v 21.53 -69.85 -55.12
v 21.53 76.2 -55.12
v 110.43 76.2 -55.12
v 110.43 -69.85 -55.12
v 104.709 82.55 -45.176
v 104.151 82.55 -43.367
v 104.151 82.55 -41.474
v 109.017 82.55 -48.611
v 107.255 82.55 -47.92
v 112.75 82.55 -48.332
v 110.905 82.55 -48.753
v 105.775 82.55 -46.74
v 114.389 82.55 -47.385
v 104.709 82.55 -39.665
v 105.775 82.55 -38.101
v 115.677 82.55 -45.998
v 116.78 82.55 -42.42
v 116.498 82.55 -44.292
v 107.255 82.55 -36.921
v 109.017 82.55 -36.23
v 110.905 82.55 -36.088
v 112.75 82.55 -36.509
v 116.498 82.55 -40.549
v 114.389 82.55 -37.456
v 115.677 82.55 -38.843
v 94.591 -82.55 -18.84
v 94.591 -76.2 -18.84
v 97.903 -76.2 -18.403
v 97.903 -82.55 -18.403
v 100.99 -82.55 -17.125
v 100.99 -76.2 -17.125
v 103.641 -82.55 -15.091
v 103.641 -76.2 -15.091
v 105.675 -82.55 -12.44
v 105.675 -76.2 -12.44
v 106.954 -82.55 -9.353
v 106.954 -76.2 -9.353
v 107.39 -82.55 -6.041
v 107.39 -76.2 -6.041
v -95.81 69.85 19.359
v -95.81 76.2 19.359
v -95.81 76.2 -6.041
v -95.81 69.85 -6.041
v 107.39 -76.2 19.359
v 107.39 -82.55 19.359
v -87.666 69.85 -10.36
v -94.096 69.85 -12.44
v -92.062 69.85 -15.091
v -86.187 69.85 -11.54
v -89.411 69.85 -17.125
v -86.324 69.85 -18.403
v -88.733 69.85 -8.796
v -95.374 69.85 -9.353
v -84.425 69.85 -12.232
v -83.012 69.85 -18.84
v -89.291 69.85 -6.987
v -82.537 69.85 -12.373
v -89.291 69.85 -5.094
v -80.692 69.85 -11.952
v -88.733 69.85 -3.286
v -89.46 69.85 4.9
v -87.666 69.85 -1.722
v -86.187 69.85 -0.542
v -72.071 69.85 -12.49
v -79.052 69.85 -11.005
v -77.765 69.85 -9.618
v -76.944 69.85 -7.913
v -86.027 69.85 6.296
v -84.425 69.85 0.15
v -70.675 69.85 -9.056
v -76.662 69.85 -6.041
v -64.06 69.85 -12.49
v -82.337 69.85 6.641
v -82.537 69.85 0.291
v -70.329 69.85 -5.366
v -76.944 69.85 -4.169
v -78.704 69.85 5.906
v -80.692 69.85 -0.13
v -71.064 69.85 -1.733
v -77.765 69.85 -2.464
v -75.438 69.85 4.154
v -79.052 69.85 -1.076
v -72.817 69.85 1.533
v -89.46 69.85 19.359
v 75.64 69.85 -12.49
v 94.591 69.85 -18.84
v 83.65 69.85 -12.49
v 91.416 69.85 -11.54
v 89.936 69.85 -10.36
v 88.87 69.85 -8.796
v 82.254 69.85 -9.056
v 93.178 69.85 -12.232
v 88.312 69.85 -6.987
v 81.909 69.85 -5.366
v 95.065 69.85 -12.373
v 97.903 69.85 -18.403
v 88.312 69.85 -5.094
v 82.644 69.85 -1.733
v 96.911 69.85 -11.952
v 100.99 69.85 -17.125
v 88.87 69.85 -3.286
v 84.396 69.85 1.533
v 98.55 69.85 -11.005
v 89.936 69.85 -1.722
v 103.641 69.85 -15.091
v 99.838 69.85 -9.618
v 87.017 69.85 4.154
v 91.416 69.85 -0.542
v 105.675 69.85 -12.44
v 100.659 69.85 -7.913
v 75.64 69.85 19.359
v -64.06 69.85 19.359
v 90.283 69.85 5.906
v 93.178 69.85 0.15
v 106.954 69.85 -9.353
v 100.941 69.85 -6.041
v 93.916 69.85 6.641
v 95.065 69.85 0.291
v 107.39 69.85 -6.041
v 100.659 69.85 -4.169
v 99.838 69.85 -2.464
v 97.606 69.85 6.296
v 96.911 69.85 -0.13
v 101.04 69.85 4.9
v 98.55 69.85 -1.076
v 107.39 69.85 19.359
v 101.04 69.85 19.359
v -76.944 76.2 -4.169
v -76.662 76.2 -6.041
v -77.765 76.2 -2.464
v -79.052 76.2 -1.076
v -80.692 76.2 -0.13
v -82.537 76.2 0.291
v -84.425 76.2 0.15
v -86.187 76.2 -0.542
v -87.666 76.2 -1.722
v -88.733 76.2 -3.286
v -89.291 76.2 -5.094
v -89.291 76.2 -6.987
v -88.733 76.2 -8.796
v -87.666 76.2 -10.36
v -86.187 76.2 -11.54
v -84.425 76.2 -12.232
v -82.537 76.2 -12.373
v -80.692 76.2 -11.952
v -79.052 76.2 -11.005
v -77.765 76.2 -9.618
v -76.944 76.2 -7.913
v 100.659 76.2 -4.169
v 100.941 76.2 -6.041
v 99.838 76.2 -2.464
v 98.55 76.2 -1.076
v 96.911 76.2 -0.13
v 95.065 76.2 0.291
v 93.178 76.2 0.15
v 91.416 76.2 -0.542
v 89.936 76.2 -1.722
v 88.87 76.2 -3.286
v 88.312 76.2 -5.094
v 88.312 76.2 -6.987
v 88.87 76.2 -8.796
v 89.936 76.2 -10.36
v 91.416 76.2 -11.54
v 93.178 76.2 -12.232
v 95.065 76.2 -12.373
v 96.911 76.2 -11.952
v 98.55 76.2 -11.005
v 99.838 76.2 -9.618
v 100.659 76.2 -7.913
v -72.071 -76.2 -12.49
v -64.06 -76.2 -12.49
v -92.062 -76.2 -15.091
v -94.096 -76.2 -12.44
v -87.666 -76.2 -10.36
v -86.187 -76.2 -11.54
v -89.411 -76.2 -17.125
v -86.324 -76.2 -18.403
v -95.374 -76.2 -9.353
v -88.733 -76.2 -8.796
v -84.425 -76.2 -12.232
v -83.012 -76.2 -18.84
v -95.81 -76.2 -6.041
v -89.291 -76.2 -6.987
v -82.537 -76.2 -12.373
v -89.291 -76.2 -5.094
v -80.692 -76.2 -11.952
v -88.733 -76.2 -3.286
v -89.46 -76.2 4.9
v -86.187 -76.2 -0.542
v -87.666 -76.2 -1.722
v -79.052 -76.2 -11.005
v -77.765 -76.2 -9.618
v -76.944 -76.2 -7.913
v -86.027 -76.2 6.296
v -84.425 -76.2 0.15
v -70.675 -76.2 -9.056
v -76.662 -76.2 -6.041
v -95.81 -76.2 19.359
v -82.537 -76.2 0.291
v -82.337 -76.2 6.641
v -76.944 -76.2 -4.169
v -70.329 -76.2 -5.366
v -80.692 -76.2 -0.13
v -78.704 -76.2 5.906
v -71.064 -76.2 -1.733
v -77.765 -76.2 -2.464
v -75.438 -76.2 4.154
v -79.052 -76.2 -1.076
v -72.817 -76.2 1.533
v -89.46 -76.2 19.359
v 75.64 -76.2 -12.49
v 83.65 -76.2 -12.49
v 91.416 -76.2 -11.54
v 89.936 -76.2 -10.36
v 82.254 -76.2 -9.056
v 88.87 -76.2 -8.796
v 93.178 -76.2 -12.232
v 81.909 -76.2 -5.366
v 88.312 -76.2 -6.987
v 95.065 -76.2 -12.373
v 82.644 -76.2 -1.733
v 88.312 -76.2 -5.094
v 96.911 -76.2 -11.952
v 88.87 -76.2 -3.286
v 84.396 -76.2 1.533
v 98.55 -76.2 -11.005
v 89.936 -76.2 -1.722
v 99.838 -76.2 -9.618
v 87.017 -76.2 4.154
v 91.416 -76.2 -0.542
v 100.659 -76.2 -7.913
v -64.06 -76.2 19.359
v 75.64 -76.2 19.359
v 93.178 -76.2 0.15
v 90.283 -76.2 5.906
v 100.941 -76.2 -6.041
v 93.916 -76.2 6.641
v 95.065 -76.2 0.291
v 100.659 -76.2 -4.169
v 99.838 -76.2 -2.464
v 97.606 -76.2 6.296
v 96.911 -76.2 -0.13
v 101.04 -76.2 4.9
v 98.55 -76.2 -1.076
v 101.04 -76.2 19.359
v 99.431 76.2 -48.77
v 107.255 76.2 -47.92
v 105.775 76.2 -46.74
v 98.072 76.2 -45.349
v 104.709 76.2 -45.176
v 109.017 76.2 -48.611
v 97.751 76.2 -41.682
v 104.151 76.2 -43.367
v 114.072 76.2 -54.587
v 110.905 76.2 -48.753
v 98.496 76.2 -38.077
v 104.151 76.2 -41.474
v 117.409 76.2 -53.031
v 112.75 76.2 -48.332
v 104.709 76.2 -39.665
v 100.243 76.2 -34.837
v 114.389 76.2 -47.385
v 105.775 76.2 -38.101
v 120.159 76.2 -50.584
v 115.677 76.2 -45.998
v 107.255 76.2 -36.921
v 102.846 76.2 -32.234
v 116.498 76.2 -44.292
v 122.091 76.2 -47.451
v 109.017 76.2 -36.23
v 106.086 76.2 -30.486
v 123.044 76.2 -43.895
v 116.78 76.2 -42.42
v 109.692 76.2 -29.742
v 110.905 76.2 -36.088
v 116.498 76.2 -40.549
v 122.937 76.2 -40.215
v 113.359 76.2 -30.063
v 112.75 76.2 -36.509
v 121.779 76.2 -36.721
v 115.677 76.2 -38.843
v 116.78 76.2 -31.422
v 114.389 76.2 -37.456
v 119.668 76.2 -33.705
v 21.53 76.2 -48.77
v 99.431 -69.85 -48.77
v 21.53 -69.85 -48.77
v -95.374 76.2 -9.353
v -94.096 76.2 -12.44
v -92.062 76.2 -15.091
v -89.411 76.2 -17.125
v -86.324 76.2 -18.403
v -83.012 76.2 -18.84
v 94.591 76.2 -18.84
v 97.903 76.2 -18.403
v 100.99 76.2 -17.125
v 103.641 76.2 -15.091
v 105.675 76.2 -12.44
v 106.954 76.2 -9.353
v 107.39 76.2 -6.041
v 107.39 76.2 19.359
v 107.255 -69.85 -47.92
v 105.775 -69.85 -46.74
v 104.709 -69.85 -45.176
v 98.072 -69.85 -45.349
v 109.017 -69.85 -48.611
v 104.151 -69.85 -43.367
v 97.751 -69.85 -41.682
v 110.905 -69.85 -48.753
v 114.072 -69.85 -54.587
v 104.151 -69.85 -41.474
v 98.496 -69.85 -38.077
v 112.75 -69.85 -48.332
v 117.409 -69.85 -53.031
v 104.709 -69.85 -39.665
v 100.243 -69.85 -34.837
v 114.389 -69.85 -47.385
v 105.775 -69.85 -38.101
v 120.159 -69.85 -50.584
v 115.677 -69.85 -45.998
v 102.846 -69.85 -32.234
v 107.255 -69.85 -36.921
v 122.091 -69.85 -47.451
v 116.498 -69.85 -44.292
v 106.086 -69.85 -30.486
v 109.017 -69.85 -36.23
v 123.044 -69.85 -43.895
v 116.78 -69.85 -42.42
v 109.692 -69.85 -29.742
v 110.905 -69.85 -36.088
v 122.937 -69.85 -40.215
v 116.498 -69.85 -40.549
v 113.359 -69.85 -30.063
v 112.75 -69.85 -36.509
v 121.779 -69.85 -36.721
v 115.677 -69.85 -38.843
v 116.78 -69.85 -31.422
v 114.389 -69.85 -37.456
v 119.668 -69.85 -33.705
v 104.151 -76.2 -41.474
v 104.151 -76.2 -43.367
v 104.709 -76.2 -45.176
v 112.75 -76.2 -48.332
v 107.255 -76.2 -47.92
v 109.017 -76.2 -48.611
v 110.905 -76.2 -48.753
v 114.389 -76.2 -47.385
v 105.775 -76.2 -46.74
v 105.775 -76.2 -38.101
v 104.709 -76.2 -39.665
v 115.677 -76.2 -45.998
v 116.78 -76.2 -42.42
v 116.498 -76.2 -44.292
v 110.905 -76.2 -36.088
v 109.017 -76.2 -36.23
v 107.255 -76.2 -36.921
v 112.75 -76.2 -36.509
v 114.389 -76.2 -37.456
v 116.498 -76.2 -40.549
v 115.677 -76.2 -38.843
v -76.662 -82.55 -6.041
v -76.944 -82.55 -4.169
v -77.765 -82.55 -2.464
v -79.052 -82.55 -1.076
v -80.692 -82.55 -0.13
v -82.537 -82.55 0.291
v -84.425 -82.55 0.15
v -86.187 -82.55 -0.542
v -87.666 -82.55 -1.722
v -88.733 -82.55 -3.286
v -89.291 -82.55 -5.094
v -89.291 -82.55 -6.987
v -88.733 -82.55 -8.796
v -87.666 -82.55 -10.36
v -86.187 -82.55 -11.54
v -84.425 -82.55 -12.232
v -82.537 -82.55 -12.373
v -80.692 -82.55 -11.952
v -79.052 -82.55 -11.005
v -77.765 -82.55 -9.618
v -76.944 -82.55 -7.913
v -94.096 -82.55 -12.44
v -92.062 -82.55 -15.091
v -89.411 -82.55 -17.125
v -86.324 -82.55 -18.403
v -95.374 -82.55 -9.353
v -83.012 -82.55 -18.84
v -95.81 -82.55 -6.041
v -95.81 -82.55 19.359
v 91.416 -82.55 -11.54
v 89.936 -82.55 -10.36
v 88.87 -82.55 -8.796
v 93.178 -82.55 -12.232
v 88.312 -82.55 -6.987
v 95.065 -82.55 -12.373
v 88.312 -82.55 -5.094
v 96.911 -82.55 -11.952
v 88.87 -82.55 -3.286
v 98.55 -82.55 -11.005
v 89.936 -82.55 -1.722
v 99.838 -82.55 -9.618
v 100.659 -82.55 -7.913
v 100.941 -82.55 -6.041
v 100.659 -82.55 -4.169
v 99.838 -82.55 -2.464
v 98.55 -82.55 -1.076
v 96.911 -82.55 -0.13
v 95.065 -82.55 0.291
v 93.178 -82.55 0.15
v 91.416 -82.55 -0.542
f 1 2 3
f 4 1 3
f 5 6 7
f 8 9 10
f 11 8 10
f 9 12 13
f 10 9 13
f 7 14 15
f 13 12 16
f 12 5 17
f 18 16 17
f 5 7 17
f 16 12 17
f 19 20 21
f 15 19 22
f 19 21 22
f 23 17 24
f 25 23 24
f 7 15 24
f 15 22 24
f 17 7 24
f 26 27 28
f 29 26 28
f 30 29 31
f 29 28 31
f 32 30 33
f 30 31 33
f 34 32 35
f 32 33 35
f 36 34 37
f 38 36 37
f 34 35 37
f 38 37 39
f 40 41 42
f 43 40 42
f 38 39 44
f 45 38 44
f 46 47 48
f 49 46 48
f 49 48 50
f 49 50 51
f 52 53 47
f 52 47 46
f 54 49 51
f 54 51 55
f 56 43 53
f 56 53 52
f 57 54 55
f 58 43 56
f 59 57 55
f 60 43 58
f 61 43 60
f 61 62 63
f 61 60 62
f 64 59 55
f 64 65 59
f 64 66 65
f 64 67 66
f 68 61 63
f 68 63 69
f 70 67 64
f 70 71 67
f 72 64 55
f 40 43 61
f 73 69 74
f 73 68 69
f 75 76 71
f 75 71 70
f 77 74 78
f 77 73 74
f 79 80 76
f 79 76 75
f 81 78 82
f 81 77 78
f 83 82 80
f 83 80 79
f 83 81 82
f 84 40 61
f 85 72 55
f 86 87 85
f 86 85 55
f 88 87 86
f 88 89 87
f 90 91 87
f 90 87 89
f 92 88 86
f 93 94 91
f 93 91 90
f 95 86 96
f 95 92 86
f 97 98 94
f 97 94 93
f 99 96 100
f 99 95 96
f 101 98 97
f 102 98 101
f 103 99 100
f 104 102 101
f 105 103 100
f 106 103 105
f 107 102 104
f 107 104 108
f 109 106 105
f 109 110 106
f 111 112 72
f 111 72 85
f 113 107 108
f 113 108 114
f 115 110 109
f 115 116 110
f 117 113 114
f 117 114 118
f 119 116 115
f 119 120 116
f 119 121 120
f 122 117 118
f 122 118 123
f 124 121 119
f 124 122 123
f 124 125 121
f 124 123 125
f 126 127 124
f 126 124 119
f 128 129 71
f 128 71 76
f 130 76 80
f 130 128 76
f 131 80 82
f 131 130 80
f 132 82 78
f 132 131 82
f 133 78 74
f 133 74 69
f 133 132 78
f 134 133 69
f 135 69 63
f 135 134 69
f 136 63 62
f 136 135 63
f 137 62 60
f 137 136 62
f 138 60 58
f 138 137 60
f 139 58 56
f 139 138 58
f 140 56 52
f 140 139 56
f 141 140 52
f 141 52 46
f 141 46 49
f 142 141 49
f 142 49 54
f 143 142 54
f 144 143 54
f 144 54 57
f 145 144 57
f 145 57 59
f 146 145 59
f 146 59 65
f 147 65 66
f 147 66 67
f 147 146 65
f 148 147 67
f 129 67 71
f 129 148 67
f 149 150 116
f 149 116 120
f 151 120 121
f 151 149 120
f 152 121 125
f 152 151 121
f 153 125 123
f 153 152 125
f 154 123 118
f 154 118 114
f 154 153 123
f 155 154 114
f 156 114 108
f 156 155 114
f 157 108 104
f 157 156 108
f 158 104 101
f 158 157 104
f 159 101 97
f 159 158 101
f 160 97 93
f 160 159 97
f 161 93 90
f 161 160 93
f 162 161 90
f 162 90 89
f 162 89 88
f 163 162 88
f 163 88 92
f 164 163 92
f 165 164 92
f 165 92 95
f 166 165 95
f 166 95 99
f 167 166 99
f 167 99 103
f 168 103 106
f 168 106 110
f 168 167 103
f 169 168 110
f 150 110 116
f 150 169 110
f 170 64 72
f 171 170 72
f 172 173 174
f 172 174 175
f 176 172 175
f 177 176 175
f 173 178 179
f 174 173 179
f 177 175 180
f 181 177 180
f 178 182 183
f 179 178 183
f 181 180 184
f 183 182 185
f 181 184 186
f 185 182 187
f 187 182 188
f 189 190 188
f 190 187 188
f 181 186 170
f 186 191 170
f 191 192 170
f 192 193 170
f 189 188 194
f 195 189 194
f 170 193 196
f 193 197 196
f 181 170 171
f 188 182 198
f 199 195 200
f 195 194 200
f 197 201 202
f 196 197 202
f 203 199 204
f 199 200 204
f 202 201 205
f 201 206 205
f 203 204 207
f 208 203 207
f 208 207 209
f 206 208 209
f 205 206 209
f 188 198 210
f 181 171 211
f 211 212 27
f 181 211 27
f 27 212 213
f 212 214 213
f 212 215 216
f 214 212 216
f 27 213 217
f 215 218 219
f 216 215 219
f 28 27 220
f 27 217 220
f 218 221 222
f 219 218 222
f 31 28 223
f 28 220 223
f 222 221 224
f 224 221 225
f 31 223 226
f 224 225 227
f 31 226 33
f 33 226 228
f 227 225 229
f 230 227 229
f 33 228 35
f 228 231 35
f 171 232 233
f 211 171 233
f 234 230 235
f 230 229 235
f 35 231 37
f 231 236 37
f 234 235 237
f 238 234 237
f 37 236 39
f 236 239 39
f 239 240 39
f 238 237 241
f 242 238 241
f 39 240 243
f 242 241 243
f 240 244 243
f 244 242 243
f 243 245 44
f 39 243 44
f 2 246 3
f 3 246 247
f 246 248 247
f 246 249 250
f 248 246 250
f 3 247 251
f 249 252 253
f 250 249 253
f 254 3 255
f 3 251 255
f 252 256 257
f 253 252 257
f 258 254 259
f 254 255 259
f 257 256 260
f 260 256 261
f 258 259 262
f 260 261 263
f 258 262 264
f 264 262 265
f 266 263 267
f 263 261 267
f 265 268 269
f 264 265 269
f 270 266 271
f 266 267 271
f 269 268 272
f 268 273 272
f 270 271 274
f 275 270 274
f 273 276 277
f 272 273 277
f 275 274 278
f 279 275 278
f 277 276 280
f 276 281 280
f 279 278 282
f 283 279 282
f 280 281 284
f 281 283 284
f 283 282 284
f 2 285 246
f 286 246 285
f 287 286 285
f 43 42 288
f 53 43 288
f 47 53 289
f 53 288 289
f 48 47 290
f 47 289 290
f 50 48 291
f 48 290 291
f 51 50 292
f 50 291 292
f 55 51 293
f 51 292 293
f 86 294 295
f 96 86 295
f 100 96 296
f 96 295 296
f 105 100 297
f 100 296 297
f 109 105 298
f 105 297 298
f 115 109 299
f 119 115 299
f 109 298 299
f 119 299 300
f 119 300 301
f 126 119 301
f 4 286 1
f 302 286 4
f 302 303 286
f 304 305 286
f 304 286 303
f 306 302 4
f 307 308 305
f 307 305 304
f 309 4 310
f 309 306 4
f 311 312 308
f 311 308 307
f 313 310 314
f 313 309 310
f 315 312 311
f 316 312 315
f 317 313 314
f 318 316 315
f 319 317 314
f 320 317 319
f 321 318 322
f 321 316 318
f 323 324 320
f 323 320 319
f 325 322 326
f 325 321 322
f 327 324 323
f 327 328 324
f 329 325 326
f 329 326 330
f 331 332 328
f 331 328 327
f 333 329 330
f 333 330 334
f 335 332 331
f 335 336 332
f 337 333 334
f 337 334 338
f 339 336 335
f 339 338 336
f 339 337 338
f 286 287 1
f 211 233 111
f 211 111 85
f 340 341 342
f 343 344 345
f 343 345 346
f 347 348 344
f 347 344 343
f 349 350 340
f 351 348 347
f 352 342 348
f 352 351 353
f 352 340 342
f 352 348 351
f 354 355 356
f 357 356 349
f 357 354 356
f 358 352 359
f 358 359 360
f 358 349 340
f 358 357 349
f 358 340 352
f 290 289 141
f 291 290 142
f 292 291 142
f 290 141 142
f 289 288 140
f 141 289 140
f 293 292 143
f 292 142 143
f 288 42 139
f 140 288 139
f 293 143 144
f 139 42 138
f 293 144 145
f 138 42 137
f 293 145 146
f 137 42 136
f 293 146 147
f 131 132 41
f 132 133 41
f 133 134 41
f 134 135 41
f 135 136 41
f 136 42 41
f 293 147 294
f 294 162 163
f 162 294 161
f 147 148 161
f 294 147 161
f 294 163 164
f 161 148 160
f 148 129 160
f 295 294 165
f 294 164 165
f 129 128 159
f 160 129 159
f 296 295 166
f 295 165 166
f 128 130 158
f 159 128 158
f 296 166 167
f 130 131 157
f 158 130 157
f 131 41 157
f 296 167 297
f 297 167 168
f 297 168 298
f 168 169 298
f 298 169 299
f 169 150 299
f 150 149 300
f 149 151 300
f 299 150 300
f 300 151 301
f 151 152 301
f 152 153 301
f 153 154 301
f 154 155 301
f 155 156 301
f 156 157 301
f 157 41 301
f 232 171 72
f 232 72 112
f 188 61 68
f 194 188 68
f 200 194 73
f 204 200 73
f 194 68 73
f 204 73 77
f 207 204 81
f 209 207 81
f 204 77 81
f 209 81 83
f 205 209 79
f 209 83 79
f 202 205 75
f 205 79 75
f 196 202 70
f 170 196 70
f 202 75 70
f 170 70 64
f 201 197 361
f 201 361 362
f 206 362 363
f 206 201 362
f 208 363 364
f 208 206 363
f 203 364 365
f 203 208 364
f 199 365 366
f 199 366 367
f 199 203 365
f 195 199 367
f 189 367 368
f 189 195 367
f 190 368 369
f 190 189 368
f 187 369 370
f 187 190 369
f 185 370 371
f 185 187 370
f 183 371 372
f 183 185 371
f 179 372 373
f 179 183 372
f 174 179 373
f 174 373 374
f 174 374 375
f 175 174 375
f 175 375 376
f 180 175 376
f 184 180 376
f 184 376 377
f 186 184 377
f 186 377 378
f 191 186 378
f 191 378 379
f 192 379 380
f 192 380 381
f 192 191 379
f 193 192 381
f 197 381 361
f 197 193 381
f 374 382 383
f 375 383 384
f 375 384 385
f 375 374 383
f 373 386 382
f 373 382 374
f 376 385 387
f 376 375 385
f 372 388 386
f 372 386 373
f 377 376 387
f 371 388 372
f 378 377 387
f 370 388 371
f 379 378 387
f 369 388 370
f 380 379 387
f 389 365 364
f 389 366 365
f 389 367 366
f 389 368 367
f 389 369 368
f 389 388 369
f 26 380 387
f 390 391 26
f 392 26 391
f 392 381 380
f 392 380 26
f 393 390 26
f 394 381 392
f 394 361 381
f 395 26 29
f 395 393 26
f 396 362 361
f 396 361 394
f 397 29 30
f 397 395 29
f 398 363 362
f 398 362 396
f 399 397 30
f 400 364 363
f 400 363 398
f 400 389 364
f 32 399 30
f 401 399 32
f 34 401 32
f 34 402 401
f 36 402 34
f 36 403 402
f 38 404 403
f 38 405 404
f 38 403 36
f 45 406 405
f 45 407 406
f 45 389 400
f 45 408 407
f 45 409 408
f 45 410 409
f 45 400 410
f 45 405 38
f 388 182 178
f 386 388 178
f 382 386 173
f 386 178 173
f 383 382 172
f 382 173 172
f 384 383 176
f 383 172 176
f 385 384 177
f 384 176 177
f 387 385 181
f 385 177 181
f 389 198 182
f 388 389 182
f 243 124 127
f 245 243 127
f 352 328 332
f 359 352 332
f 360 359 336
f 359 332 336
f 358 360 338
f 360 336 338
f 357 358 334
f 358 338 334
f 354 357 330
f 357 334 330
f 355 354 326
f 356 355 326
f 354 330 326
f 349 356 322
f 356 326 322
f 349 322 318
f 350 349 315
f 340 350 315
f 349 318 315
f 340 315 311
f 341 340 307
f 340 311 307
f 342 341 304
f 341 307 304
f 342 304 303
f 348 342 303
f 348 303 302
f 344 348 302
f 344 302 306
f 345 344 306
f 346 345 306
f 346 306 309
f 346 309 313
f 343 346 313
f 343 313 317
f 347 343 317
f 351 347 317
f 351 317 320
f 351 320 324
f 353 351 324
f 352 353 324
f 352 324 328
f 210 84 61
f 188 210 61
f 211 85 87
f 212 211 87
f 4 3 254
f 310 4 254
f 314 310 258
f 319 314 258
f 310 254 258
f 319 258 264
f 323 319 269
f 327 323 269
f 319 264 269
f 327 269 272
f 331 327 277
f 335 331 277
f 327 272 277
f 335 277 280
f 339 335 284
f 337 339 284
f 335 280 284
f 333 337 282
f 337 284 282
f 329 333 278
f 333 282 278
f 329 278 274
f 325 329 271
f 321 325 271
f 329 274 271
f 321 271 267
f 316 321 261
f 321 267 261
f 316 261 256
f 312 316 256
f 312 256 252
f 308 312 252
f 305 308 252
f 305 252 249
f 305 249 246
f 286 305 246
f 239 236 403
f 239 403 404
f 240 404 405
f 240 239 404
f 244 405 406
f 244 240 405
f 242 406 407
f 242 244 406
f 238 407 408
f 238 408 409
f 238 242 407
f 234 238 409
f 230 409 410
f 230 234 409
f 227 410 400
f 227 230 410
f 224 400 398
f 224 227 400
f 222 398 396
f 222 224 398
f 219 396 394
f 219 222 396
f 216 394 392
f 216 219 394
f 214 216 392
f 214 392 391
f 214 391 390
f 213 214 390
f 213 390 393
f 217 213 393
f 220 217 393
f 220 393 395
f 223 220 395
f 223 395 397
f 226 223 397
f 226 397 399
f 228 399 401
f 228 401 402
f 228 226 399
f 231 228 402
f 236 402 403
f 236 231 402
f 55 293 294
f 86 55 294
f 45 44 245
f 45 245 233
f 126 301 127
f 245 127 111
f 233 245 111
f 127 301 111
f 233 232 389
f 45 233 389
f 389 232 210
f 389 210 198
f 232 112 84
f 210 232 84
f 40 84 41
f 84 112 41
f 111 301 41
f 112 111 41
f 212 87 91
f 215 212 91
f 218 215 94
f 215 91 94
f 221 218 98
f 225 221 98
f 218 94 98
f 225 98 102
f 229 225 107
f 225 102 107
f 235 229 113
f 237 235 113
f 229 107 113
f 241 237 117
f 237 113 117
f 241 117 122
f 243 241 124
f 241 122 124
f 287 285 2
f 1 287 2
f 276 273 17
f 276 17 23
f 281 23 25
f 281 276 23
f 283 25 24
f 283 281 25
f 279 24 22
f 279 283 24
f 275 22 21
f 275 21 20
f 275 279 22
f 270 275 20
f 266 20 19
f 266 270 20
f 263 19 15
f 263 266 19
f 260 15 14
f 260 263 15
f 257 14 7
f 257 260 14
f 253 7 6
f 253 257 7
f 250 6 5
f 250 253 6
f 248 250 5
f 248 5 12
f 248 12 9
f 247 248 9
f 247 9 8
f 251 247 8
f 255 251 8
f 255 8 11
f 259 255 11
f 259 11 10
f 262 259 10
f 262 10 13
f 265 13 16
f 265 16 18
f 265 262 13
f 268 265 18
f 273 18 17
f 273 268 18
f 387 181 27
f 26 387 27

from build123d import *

# Parameters (mm, degrees)
F1_R           = 6.35
F2_DEPTH       = 6.35
F3_DEPTH       = 152.4
F4_DEPTH       = 152.4
F6_R           = 6.35
F7_DEPTH       = 6.35
F8_R           = 6.35
F9_DEPTH       = 146.05
F10_DEPTH      = 152.4
F10_DEPTH_BACK = 6.35


with BuildPart() as f2:
    # F1 (on offset) → F2 (new body)
    with BuildSketch(Plane.XZ.offset(-76.2)):
        with BuildLine():
            Line((-89.460294, 19.359184), (-95.810294, 19.359184))
            Line((-95.810294, 19.359184), (-95.810294, -6.040816))
            ThreePointArc((-95.810294, -6.040816), (-92.061619, -15.090917), (-83.011518, -18.839591))
            Line((-83.011518, -18.839591), (94.59093, -18.839591))
            ThreePointArc((94.59093, -18.839591), (103.641031, -15.090917), (107.389706, -6.040816))
            Line((107.389706, -6.040816), (107.389706, 19.359184))
            Line((107.389706, 19.359184), (101.039706, 19.359184))
            Line((101.039706, 19.359184), (101.039706, 4.900084))
            ThreePointArc((101.039706, 4.900084), (85.610674, 2.939441), (83.65003, -12.489591))
            Line((83.65003, -12.489591), (75.639706, -12.489591))
            Line((75.639706, -12.489591), (75.639706, 19.359184))
            Line((75.639706, 19.359184), (-64.060294, 19.359184))
            Line((-64.060294, 19.359184), (-64.060294, -12.489591))
            Line((-64.060294, -12.489591), (-72.070618, -12.489591))
            ThreePointArc((-72.070618, -12.489591), (-74.031262, 2.939441), (-89.460294, 4.900084))
            Line((-89.460294, 4.900084), (-89.460294, 19.359184))
        make_face()
        with Locations((-83.011518, -6.040816)):
            Circle(F1_R, mode=Mode.SUBTRACT)
        with Locations((94.59093, -6.040816)):
            Circle(F1_R, mode=Mode.SUBTRACT)
    extrude(amount=F2_DEPTH)

    # F1 (on offset) → F3 (join)
    with BuildSketch(Plane.XZ.offset(-76.2)):
        with BuildLine():
            Line((-64.060294, 19.359184), (-89.460294, 19.359184))
            Line((-89.460294, 19.359184), (-89.460294, 4.900084))
            ThreePointArc((-89.460294, 4.900084), (-74.031262, 2.939441), (-72.070618, -12.489591))
            Line((-72.070618, -12.489591), (-64.060294, -12.489591))
            Line((-64.060294, -12.489591), (-64.060294, 19.359184))
        make_face()
    extrude(amount=F3_DEPTH)

    # F1 (on offset) → F4 (join)
    with BuildSketch(Plane.XZ.offset(-76.2)):
        with BuildLine():
            Line((101.039706, 19.359184), (75.639706, 19.359184))
            Line((75.639706, 19.359184), (75.639706, -12.489591))
            Line((75.639706, -12.489591), (83.65003, -12.489591))
            ThreePointArc((83.65003, -12.489591), (85.610674, 2.939441), (101.039706, 4.900084))
            Line((101.039706, 4.900084), (101.039706, 19.359184))
        make_face()
    extrude(amount=F4_DEPTH)

    # F6 (on offset) → F7 (join)
    with BuildSketch(Plane.XZ.offset(76.2)):
        with BuildLine():
            Line((-89.460294, 19.359184), (-95.810294, 19.359184))
            Line((-95.810294, 19.359184), (-95.810294, -6.040816))
            ThreePointArc((-95.810294, -6.040816), (-92.061619, -15.090917), (-83.011518, -18.839591))
            Line((-83.011518, -18.839591), (94.59093, -18.839591))
            ThreePointArc((94.59093, -18.839591), (103.641031, -15.090917), (107.389706, -6.040816))
            Line((107.389706, -6.040816), (107.389706, 19.359184))
            Line((107.389706, 19.359184), (-89.460294, 19.359184))
        make_face()
        with Locations((-83.011518, -6.040816)):
            Circle(F6_R, mode=Mode.SUBTRACT)
        with Locations((94.59093, -6.040816)):
            Circle(F6_R, mode=Mode.SUBTRACT)
    extrude(amount=F7_DEPTH)


with BuildPart() as f9:
    # F8 (on offset) → F9 (new body)
    with BuildSketch(Plane.XZ.offset(-76.2)):
        with BuildLine():
            Line((21.530006, -55.120495), (110.430006, -55.120495))
            ThreePointArc((110.430006, -55.120495), (116.780006, -31.421973), (99.431483, -48.770495))
            Line((99.431483, -48.770495), (21.530006, -48.770495))
            Line((21.530006, -48.770495), (21.530006, -55.120495))
        make_face()
        with Locations((110.430006, -42.420495)):
            Circle(F8_R, mode=Mode.SUBTRACT)
    extrude(amount=F9_DEPTH)

    # F8 (on offset) → F10 (join, two sides)
    with BuildSketch(Plane.XZ.offset(-76.2)) as f10_sk:
        with Locations((110.430006, -42.420495)):
            Circle(F8_R)
    extrude(amount=F10_DEPTH)
    extrude(f10_sk.sketch, amount=-F10_DEPTH_BACK)


solid = Compound([f2.part, f9.part])
